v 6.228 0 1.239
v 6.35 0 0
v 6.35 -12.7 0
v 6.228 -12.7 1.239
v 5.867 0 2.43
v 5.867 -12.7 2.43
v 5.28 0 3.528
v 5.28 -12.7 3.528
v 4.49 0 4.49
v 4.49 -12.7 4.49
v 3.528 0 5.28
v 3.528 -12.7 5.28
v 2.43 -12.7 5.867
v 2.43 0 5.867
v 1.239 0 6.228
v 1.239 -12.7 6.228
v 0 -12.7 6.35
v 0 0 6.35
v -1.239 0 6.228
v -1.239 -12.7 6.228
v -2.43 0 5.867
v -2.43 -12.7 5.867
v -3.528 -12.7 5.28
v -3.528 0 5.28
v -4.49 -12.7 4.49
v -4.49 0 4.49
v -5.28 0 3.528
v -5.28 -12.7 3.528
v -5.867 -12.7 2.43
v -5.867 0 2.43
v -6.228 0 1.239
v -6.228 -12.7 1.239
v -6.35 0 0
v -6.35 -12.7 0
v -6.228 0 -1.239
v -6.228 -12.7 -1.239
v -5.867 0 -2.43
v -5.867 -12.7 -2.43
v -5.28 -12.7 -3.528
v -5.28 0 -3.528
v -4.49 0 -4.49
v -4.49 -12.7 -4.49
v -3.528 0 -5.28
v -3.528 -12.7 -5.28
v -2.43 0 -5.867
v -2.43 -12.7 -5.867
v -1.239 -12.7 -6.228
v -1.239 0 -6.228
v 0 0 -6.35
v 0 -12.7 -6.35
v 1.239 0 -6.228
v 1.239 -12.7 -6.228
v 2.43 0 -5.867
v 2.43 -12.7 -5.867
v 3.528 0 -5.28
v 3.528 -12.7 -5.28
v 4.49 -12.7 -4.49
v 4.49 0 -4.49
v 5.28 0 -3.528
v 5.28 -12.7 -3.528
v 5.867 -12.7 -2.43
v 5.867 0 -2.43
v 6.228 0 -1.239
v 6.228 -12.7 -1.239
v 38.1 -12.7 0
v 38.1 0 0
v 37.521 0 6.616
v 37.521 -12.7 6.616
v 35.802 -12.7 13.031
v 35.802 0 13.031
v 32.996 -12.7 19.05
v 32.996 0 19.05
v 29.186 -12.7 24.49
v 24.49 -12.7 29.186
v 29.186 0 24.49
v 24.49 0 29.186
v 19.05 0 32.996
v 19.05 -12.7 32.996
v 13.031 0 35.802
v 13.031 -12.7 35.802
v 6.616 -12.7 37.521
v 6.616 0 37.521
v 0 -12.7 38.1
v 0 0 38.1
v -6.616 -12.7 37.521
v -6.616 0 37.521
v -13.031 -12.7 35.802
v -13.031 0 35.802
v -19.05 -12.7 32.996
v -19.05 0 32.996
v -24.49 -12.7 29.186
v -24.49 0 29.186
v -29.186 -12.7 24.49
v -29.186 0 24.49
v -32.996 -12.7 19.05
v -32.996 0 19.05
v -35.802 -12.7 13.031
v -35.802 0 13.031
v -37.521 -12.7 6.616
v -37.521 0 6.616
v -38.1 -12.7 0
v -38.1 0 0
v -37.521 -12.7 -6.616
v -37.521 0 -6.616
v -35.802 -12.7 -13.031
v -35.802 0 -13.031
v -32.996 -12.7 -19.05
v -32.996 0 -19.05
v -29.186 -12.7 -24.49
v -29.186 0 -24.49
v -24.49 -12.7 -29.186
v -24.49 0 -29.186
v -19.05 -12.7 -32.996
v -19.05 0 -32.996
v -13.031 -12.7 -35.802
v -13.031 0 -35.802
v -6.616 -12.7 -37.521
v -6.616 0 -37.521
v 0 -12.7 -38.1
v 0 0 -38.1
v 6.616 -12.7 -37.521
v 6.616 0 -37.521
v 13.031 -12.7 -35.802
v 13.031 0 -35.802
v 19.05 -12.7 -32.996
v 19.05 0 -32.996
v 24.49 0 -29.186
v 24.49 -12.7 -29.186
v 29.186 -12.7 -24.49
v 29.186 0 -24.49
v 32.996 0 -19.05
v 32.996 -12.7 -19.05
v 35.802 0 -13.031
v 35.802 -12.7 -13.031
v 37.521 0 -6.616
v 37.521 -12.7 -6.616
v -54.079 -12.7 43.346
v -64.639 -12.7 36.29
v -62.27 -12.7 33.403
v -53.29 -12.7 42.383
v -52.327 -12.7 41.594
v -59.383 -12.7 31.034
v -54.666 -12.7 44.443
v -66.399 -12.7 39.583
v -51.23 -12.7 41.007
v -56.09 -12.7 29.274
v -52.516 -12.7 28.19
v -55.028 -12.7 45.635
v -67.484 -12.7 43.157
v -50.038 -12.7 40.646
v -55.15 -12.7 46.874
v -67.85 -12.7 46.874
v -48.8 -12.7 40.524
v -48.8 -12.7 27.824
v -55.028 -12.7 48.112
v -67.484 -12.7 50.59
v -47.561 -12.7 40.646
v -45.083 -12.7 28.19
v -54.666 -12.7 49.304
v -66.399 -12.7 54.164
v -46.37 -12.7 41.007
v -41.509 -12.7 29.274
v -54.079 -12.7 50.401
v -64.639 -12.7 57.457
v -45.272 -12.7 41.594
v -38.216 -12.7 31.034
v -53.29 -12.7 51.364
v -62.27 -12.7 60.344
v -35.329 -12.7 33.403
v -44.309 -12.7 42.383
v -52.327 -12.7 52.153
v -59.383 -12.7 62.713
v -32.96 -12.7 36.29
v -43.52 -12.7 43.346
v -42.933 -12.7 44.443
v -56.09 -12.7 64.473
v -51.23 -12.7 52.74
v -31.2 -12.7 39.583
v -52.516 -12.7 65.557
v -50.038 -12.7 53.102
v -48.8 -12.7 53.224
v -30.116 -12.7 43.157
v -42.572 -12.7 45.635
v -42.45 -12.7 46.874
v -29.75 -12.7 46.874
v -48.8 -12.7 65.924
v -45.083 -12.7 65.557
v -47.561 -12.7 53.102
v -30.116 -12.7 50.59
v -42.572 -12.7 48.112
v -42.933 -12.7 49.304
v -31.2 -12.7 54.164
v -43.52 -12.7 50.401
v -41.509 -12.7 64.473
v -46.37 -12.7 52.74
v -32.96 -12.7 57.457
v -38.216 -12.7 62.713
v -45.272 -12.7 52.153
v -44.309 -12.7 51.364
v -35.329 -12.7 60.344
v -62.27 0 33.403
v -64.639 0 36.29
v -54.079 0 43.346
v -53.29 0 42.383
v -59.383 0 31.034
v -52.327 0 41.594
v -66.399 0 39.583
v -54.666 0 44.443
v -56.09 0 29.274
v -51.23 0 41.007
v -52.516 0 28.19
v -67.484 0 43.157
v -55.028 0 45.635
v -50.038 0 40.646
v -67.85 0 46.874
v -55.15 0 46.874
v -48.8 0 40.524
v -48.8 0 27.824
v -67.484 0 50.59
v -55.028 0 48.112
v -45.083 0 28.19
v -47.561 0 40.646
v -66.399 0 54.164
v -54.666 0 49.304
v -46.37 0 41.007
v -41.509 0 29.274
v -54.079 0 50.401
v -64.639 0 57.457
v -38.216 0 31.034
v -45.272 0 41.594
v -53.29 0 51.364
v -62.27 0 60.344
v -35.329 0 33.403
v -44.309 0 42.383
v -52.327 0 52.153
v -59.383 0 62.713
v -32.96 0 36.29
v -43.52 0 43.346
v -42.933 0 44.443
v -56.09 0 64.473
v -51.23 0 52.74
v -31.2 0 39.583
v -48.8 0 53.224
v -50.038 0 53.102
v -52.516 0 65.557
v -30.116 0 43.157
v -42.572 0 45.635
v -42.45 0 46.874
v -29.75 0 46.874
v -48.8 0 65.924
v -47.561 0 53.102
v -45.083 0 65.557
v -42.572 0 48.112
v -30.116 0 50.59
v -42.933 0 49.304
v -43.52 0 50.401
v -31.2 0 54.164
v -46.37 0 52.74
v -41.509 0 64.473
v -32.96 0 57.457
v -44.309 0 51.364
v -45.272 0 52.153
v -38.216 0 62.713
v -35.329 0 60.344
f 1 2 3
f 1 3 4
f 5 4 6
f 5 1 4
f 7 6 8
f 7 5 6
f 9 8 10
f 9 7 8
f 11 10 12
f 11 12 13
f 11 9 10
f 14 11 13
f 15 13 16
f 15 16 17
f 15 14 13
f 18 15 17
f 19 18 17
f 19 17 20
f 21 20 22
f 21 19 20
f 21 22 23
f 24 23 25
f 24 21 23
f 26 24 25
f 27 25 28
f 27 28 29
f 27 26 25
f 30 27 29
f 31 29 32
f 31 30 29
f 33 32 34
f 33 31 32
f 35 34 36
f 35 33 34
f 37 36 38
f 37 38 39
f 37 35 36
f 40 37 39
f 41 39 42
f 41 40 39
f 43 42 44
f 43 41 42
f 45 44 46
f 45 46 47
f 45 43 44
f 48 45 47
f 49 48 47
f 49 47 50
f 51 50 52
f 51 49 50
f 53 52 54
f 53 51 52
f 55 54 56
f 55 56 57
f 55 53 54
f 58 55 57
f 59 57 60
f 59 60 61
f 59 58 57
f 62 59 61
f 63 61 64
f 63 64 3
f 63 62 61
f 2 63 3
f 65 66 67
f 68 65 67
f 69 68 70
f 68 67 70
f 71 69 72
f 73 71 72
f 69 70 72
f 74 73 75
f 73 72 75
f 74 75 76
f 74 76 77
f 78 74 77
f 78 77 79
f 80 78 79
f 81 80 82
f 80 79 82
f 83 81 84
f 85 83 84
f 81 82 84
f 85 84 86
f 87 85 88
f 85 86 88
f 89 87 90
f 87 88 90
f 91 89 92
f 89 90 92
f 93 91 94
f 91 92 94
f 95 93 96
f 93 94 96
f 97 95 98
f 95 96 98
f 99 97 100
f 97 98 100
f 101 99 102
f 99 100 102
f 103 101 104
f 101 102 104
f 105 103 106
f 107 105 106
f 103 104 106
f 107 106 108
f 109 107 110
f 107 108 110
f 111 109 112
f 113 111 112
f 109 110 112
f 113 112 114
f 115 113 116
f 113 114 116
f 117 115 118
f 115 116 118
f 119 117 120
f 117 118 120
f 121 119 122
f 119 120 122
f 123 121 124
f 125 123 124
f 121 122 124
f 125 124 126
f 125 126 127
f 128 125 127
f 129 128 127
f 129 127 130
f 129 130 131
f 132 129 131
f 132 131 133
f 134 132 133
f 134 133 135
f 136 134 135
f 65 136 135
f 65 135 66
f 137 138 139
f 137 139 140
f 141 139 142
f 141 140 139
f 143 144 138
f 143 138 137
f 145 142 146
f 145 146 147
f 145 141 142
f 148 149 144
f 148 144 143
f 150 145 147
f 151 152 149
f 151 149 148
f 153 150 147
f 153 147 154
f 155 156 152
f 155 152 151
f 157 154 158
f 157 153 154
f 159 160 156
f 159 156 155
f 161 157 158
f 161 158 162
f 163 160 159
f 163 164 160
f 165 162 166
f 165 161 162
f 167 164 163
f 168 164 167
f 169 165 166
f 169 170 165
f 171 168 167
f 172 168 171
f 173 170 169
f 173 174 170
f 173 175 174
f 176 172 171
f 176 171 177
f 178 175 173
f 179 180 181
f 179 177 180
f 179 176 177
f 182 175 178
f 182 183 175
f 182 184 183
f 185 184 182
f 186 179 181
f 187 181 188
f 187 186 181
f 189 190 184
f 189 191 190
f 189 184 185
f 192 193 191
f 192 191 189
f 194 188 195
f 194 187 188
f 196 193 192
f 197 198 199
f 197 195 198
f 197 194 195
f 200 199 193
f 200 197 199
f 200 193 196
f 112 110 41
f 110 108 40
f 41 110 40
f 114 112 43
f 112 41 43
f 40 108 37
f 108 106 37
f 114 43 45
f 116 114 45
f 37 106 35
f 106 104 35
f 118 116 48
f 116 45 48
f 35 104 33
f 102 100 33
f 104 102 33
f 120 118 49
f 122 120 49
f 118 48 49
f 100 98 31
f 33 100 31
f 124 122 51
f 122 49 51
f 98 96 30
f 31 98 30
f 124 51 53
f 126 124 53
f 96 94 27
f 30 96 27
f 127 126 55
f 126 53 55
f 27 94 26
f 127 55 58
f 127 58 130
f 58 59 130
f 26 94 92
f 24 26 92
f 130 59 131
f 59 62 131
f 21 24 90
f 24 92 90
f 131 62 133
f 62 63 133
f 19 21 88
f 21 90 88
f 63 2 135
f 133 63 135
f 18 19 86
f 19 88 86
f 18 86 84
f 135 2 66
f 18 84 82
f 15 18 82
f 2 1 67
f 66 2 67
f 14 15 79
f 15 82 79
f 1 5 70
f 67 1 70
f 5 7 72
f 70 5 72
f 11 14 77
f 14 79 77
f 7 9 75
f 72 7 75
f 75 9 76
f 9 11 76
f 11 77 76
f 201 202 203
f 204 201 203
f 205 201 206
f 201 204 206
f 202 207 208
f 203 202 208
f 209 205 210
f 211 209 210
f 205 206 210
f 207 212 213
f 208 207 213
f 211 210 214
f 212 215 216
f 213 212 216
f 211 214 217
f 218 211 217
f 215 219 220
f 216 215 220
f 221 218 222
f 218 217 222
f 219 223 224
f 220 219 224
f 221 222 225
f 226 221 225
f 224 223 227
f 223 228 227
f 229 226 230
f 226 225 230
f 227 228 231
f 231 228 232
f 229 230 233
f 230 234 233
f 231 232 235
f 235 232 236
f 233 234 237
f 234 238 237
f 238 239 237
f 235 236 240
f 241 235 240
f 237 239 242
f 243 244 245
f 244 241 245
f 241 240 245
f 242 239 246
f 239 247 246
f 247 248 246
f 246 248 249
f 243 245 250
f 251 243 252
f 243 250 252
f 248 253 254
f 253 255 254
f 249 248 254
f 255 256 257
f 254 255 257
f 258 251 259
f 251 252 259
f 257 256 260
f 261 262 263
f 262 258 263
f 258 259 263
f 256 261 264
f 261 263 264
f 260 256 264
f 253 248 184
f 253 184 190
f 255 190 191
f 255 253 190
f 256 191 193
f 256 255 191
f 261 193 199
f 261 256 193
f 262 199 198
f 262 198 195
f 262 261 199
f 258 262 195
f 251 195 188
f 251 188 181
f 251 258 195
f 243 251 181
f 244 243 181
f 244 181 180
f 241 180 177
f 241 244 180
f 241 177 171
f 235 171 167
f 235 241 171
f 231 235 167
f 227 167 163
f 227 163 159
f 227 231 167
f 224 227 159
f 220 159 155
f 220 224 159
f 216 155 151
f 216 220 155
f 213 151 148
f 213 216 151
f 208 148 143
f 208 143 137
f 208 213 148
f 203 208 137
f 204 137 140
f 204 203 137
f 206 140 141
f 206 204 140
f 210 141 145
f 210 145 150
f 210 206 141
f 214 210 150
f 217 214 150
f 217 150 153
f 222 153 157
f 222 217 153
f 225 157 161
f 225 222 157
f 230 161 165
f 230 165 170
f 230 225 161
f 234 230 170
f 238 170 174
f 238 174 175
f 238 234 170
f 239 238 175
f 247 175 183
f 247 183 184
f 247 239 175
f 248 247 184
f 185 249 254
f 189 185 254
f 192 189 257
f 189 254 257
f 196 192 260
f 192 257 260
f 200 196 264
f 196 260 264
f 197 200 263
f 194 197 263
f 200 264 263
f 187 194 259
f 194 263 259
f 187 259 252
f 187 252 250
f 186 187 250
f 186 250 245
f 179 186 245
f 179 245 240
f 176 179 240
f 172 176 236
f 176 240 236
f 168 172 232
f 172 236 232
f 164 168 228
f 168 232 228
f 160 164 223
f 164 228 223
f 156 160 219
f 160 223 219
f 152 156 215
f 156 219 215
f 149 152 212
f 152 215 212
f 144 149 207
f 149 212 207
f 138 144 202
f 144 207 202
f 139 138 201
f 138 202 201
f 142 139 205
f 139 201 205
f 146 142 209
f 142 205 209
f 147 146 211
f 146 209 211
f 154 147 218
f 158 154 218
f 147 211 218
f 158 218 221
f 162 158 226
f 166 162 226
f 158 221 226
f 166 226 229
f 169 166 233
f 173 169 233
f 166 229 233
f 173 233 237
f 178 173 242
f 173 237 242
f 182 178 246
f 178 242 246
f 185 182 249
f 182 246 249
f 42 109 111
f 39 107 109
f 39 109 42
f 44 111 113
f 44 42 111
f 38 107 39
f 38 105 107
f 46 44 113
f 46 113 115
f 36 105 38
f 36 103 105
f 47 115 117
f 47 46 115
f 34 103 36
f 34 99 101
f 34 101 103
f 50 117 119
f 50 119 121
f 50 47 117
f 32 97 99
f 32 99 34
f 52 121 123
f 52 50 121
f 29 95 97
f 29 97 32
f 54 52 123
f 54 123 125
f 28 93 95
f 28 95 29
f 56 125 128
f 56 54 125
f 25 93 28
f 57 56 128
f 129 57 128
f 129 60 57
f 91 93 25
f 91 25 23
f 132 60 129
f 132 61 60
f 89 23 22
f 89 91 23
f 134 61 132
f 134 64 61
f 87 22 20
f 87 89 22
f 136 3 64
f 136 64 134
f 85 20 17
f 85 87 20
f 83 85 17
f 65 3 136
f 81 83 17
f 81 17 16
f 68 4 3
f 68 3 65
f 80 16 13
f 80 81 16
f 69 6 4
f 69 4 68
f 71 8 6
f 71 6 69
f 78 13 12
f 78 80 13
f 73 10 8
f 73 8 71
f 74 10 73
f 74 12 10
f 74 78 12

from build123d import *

# Parameters (mm, degrees)
F0_R     = 38.1
F0_R_2   = 6.35
F0_R_3   = 19.05
F1_DEPTH = 12.7


with BuildPart() as f1:
    # F0 (on Front) → F1 (new body)
    with BuildSketch(Plane.XZ):
        Circle(F0_R)
        Circle(F0_R_2, mode=Mode.SUBTRACT)
        with Locations((-48.799555, 46.873532)):
            Circle(F0_R_3)
        with Locations((-48.799555, 46.873532)):
            Circle(F0_R_2, mode=Mode.SUBTRACT)
    extrude(amount=F1_DEPTH)


solid = f1.part
